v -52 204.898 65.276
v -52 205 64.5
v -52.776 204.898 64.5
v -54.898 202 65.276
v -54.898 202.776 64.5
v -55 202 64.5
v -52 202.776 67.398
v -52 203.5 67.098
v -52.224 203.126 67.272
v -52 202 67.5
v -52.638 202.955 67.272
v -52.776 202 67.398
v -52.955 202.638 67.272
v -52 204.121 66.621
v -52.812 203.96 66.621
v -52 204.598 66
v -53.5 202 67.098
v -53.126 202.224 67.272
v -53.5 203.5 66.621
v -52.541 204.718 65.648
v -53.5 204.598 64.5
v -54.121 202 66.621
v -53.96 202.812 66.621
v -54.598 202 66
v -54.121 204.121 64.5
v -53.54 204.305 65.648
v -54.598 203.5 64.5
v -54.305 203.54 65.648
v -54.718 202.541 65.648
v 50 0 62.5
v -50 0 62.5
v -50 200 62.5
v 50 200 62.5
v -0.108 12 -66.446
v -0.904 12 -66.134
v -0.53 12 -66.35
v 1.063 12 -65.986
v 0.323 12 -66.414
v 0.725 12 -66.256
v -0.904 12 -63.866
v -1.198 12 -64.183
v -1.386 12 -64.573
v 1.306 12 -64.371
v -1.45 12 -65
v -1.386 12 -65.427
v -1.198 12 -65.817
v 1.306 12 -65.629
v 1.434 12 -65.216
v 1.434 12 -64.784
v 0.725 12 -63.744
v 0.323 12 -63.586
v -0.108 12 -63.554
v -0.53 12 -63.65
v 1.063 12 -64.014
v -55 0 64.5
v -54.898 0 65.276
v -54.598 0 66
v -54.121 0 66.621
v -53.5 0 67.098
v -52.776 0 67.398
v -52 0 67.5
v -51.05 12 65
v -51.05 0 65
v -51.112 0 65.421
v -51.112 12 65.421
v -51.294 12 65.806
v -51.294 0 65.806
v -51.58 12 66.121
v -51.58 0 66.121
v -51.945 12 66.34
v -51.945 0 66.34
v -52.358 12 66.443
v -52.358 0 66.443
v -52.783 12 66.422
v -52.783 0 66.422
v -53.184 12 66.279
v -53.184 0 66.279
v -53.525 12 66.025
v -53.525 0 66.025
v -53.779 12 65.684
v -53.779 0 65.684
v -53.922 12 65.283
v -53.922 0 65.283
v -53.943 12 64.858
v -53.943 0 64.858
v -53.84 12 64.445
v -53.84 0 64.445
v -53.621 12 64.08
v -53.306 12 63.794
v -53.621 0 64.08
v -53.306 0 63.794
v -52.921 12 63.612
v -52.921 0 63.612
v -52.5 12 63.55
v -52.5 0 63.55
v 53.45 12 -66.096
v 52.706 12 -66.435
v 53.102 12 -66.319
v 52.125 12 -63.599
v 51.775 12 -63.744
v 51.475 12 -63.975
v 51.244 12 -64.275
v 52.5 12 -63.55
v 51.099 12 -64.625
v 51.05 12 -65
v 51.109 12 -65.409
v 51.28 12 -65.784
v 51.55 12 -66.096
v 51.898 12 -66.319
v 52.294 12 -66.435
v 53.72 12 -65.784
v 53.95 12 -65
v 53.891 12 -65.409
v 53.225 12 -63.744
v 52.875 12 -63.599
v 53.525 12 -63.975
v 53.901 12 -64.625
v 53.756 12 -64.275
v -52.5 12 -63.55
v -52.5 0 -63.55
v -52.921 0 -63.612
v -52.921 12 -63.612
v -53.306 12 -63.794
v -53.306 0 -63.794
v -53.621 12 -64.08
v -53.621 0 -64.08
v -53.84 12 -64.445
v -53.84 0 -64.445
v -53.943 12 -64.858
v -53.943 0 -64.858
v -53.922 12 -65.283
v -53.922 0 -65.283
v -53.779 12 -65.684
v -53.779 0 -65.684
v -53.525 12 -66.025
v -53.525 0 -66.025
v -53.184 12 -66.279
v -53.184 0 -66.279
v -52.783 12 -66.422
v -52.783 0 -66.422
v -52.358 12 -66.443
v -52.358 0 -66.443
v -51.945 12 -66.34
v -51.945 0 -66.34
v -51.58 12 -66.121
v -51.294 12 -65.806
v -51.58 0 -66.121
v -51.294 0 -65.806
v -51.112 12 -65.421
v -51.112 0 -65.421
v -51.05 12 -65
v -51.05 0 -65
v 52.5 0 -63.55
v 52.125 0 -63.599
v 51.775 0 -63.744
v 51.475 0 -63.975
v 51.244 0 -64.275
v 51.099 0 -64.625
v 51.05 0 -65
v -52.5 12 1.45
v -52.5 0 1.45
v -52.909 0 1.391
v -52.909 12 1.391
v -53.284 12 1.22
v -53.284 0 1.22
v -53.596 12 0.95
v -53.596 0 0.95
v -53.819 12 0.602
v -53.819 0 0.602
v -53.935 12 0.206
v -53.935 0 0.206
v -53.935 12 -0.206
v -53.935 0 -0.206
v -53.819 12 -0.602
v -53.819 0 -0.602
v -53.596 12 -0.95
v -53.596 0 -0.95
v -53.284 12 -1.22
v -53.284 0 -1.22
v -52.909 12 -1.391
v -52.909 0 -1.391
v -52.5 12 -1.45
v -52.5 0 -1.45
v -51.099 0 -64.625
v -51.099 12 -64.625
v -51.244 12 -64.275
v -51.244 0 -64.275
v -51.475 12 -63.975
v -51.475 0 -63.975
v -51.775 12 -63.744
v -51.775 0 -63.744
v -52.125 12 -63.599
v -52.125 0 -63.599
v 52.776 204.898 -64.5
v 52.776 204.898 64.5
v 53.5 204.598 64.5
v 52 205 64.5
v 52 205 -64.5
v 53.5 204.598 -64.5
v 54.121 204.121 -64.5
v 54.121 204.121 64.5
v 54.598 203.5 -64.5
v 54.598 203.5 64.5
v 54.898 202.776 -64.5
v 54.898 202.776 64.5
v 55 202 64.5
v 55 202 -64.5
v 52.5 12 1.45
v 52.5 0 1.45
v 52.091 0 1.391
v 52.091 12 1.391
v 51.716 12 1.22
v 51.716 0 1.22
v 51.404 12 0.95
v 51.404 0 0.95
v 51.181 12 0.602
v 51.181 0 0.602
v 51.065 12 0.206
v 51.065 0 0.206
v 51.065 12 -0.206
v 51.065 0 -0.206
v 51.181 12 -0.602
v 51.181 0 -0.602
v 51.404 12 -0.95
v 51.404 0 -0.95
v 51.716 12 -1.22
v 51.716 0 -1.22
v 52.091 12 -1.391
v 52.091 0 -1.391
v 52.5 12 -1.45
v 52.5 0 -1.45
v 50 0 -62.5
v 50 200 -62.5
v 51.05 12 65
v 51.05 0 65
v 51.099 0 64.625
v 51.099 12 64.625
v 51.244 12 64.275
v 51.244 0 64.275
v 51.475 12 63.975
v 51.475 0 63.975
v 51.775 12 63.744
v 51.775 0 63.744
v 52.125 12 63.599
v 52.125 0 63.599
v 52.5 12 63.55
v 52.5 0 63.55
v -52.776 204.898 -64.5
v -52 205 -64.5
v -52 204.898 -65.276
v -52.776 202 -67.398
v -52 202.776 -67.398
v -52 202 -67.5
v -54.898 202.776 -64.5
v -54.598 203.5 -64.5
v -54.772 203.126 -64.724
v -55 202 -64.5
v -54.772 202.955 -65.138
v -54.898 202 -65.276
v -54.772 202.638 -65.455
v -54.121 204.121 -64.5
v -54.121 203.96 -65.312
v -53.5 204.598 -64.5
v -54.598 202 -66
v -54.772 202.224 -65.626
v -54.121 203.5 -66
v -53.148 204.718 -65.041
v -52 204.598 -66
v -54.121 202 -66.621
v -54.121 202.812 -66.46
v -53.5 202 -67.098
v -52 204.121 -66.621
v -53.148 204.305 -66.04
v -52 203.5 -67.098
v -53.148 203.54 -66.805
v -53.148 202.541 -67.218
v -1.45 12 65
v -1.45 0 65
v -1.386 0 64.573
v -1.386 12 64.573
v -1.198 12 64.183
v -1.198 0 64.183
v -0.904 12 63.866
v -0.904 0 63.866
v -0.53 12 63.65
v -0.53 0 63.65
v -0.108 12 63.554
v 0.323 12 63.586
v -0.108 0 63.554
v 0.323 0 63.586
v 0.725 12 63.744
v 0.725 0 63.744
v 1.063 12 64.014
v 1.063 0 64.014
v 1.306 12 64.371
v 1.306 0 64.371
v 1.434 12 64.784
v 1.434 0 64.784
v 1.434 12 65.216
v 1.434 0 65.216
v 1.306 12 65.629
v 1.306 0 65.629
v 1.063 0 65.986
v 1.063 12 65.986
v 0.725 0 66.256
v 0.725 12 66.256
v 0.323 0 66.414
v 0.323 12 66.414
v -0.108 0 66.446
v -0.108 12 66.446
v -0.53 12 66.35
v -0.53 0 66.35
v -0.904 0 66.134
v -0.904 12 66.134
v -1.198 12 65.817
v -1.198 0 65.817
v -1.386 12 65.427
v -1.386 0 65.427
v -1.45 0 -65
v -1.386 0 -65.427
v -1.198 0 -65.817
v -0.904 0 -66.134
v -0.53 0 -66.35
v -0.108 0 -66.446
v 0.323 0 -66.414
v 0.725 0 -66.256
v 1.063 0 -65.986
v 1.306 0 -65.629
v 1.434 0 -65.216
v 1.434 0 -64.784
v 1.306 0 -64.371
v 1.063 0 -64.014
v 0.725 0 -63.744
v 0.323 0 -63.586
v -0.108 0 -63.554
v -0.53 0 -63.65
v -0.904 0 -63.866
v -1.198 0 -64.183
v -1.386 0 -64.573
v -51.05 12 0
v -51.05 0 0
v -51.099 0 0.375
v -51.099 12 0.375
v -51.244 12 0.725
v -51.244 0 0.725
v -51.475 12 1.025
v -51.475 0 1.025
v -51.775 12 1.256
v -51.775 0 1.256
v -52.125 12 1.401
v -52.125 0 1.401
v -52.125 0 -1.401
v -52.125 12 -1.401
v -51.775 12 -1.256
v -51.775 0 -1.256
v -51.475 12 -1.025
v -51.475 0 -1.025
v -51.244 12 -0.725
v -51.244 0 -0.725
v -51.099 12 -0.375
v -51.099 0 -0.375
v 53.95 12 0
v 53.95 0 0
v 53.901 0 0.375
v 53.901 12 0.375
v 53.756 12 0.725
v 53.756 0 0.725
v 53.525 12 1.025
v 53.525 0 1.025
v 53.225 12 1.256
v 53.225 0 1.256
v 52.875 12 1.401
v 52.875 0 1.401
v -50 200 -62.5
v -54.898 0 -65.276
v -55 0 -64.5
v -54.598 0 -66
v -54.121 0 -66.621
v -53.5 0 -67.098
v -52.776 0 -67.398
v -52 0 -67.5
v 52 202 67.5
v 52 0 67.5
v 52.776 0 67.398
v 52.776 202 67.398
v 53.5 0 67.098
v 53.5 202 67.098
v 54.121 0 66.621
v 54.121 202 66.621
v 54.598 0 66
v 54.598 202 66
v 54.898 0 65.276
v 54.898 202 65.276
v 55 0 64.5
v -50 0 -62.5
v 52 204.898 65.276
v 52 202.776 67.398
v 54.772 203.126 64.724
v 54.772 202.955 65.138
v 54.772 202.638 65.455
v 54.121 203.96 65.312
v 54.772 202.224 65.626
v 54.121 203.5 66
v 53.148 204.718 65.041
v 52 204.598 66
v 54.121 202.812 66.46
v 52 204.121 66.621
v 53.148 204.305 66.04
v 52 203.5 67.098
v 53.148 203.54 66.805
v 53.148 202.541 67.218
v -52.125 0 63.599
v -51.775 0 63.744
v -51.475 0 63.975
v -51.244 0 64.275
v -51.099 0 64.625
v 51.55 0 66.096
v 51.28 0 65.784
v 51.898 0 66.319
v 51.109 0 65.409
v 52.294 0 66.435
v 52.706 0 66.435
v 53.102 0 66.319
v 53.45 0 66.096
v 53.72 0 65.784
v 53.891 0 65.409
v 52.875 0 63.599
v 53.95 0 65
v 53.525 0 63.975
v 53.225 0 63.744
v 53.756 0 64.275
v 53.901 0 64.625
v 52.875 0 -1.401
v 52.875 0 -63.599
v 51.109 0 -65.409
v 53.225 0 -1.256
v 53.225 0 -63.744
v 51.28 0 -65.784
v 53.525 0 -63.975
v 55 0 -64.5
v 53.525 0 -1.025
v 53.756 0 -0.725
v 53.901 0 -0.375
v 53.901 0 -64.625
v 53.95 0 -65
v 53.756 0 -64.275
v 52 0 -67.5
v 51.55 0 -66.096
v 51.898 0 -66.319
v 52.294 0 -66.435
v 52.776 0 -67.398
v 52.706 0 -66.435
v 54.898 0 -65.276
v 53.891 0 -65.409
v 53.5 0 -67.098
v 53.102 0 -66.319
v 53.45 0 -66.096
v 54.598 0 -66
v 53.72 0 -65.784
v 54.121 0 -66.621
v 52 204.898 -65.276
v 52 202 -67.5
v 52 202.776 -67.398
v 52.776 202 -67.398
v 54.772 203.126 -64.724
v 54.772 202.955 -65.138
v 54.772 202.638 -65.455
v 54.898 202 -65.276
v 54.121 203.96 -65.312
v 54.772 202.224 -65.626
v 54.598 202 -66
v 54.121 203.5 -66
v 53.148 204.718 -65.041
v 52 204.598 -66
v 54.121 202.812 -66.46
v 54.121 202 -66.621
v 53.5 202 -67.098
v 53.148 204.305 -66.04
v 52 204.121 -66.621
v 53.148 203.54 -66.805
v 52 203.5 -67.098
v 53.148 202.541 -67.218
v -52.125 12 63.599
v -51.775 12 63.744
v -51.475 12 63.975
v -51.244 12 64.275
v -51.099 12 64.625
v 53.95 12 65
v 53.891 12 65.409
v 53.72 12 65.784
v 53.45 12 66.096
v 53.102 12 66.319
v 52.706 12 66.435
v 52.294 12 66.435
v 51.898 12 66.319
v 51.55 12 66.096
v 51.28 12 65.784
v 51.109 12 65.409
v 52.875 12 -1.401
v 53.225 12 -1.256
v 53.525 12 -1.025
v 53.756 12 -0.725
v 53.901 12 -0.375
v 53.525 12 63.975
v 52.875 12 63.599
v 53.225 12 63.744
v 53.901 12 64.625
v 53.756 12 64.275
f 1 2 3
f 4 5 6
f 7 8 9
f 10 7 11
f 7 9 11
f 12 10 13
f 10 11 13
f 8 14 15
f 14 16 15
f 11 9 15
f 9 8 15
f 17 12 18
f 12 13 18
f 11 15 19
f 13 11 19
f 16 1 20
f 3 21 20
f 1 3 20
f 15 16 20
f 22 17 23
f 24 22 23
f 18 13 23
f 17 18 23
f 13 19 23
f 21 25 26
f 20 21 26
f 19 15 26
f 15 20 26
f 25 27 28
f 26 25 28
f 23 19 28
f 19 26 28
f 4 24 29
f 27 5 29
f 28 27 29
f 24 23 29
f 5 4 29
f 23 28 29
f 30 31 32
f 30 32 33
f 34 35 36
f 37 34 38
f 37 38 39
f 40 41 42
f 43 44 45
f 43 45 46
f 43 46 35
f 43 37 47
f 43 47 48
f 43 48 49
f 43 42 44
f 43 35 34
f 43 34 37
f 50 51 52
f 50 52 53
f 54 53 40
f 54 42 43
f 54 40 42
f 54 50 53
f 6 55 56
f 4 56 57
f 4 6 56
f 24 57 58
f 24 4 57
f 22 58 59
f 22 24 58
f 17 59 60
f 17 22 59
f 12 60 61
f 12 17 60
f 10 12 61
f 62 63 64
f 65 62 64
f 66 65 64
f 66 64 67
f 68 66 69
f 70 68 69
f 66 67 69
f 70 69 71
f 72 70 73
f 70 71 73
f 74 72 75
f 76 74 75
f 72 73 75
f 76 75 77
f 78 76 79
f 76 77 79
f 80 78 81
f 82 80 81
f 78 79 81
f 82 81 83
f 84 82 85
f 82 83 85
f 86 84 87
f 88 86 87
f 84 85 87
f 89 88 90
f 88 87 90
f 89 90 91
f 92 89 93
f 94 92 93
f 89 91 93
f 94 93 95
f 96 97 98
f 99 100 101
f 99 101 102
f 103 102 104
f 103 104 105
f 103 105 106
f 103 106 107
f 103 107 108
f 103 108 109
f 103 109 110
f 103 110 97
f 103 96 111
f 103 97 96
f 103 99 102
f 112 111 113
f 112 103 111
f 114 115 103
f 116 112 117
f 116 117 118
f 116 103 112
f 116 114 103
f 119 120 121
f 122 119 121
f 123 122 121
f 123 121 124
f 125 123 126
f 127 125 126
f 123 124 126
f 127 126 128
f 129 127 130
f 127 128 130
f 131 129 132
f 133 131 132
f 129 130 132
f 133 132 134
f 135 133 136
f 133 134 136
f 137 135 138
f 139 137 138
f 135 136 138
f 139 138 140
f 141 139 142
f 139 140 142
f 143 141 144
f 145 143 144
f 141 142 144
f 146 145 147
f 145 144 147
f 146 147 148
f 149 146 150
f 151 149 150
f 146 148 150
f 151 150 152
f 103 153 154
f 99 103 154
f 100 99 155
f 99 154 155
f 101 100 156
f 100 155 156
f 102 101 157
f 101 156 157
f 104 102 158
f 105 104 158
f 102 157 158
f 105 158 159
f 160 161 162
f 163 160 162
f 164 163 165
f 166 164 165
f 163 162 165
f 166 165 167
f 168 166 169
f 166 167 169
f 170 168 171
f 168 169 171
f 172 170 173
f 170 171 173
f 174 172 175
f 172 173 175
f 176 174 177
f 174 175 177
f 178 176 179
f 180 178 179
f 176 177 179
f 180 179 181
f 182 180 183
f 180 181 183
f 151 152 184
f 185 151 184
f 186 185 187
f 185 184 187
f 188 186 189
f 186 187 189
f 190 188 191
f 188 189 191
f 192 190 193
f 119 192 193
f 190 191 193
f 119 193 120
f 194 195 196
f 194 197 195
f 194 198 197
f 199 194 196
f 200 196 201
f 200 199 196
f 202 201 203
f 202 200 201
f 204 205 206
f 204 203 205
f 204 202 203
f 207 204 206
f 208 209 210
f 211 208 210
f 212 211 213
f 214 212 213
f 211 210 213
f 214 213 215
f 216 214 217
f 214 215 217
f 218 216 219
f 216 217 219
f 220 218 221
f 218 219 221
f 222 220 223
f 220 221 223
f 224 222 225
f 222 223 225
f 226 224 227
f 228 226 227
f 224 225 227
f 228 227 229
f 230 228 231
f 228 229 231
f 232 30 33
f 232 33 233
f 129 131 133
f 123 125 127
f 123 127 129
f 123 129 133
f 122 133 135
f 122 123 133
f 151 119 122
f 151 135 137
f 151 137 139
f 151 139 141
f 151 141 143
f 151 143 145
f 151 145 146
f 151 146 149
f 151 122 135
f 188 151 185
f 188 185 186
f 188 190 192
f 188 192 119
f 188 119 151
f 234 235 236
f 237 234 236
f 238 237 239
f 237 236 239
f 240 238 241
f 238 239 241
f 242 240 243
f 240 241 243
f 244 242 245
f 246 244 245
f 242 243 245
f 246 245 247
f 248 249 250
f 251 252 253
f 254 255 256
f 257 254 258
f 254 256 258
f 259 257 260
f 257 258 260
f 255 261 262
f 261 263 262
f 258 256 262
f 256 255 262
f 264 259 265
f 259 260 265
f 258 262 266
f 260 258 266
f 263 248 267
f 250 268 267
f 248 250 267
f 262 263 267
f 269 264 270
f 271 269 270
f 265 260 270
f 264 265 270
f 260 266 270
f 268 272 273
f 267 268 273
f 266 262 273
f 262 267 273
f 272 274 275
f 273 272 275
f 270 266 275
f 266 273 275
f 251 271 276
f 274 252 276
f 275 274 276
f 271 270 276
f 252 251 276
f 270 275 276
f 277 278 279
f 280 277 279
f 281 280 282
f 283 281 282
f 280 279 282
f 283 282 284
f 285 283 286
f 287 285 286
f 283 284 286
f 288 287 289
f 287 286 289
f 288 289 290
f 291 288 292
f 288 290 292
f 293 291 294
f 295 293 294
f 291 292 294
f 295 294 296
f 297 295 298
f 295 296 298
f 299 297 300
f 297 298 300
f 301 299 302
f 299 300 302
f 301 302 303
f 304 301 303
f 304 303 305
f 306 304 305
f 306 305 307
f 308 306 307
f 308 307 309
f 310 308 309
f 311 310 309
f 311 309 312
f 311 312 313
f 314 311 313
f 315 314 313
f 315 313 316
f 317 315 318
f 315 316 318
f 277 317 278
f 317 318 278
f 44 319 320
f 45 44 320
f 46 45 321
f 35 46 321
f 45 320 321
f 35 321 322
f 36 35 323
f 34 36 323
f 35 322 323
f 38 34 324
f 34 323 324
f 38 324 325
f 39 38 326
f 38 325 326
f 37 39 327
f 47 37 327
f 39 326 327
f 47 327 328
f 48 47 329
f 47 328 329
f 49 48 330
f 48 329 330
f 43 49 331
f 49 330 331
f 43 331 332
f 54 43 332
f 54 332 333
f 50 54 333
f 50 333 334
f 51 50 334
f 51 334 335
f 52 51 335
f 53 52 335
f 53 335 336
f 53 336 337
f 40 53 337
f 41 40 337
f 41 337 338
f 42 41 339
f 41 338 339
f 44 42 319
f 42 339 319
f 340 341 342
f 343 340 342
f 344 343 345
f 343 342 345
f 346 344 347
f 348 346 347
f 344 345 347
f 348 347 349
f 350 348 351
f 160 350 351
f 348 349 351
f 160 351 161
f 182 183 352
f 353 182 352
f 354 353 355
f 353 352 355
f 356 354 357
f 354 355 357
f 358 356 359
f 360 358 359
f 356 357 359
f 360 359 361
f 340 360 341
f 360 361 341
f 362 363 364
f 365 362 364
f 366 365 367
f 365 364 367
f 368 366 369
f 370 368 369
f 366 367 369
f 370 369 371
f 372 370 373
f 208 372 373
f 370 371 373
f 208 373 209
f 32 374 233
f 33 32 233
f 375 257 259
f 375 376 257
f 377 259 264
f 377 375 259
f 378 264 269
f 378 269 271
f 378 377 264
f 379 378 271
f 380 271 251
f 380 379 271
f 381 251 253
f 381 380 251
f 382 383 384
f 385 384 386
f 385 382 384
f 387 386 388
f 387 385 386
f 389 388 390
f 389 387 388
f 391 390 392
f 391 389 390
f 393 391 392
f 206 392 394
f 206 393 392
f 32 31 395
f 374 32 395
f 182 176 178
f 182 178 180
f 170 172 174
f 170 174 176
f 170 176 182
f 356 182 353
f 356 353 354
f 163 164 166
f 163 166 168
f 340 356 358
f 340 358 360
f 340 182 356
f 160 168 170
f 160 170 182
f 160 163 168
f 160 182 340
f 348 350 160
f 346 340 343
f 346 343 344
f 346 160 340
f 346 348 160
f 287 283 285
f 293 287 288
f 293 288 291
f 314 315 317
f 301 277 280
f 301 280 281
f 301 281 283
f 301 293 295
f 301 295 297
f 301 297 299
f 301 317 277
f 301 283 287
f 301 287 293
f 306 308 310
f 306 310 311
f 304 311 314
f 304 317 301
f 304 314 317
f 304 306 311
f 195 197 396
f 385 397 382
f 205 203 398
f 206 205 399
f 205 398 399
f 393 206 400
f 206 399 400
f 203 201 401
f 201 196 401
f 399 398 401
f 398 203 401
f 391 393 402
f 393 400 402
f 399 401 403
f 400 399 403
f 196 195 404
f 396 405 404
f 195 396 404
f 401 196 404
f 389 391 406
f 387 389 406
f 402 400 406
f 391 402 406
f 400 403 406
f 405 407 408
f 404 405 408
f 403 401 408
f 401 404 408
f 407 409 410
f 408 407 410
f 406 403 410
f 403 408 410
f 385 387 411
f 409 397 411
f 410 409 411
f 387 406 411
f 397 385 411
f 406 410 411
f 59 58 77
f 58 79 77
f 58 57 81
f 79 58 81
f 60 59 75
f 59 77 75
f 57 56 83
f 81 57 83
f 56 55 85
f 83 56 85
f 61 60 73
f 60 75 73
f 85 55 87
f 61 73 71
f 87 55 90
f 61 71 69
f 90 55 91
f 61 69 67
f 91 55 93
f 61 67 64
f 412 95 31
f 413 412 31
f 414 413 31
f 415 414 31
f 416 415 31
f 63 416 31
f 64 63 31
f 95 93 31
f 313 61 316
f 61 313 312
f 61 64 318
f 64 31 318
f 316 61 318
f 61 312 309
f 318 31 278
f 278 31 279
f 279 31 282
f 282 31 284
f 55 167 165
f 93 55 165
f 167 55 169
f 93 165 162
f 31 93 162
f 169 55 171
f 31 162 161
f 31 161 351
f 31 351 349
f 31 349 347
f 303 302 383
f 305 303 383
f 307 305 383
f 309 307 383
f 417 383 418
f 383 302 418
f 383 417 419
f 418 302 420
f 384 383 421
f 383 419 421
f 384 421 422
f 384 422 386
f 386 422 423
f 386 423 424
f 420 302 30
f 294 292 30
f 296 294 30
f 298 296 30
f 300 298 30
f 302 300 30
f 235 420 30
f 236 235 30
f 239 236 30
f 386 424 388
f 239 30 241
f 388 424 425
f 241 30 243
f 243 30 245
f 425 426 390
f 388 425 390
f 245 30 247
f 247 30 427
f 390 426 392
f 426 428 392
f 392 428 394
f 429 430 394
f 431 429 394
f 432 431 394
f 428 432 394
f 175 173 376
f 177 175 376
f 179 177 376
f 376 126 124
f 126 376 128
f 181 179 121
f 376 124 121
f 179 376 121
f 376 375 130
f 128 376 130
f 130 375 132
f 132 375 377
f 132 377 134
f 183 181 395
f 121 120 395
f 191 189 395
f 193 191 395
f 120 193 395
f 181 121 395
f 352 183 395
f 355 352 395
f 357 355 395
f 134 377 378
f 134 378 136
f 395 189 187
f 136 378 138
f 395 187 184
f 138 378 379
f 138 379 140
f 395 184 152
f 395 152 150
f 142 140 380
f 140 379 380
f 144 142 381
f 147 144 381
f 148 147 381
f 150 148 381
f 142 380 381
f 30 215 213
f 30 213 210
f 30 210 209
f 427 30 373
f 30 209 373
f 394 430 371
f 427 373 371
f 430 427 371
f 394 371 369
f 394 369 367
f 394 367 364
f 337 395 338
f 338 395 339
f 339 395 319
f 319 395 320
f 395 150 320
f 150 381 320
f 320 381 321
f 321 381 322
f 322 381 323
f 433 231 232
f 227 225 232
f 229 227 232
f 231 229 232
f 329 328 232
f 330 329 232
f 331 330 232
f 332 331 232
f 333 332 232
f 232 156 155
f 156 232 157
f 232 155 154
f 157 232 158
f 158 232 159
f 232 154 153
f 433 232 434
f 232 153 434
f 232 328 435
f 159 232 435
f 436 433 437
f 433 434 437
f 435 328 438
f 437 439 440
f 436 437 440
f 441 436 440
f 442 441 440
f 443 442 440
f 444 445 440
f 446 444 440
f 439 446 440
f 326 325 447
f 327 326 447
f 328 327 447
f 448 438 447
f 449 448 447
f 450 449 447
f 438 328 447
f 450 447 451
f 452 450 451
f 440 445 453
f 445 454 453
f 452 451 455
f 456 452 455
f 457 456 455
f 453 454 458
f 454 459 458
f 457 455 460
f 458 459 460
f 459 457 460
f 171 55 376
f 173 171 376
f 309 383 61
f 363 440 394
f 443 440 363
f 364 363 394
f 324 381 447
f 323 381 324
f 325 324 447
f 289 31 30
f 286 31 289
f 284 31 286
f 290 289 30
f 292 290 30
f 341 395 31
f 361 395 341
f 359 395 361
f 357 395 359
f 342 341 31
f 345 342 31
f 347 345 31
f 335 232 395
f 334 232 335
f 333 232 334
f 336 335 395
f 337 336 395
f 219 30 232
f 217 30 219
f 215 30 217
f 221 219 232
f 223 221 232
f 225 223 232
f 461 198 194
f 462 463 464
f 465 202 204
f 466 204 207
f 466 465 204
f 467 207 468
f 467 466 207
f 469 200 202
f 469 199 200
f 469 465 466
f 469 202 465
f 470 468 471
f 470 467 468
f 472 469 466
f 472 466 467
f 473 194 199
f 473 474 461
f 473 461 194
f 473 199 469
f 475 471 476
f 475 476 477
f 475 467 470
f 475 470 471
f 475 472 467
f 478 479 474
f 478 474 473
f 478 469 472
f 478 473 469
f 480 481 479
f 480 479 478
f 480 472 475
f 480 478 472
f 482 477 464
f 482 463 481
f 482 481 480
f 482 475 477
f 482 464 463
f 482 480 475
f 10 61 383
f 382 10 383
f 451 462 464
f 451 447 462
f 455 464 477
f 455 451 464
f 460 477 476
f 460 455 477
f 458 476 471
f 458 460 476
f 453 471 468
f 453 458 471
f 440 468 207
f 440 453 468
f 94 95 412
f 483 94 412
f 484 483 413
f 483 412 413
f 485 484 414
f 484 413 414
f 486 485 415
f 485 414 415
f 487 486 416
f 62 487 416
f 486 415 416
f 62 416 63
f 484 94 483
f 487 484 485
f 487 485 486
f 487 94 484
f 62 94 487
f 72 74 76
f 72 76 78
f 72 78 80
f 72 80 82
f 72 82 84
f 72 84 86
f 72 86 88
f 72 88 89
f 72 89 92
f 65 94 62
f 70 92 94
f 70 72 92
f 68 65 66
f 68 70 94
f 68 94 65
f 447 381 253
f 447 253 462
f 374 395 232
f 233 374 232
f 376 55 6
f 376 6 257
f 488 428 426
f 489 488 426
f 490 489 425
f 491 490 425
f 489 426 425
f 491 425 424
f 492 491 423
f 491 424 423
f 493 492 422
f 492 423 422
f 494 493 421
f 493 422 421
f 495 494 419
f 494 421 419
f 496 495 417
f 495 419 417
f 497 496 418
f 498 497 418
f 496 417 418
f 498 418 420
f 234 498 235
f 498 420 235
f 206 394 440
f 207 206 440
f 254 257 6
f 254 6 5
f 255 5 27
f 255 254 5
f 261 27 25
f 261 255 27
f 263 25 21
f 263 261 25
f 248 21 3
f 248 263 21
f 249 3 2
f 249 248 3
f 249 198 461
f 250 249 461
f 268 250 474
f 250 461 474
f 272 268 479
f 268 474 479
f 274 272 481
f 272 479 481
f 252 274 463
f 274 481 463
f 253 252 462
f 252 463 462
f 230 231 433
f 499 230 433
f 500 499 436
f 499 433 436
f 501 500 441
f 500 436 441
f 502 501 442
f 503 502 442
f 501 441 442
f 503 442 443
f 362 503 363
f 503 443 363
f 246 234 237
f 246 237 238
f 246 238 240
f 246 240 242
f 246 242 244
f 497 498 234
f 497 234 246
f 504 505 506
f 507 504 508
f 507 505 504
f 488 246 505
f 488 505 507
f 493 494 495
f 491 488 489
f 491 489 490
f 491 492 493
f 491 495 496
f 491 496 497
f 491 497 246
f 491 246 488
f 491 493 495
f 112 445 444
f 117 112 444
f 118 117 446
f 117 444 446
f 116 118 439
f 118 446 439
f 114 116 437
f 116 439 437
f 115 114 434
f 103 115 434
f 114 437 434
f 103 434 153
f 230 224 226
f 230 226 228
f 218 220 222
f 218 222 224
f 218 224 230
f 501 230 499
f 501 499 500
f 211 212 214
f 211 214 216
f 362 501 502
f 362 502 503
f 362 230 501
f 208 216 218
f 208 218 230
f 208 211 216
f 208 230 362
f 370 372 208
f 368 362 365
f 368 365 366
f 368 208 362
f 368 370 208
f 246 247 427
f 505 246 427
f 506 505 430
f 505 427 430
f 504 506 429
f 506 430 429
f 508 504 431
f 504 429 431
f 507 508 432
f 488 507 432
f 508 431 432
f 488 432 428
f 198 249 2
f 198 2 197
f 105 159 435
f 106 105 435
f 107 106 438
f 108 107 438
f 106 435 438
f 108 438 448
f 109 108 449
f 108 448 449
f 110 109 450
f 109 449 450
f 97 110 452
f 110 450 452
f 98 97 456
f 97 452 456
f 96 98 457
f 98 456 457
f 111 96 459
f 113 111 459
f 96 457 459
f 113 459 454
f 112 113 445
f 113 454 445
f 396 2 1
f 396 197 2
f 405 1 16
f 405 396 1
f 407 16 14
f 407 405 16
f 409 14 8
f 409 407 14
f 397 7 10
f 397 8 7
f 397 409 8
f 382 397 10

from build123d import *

# Parameters (mm, degrees)
SKETCH1_W           = 110
SKETCH1_H           = 135
SKETCH1_W_2         = 100
SKETCH1_H_2         = 125
BOSS_EXTRUDE1_DEPTH = 200
SKETCH2_W           = 110
SKETCH2_H           = 135
BOSS_EXTRUDE2_DEPTH = 5
CUT_EXTRUDE1_DEPTH  = 12
FILLET1_R           = 3


with BuildPart() as part:
    # Sketch1 → Boss-Extrude1 (new body)
    with BuildSketch(Plane(origin=(0, 0, 0), x_dir=(1, 0, 0), z_dir=(0, 1, 0))):
        Rectangle(SKETCH1_W, SKETCH1_H)
        Rectangle(SKETCH1_W_2, SKETCH1_H_2, mode=Mode.SUBTRACT)
    extrude(amount=BOSS_EXTRUDE1_DEPTH)

    # Sketch2 → Boss-Extrude2 (add)
    with BuildSketch(Plane(origin=(0, 200, 0), x_dir=(1, 0, 0), z_dir=(0, 1, 0))):
        Rectangle(SKETCH2_W, SKETCH2_H)
    extrude(amount=BOSS_EXTRUDE2_DEPTH)

    # Sketch3 → Cut-Extrude1 (cut)
    with BuildSketch(Plane.XZ):
        with BuildLine():
            ThreePointArc((1.45, -65), (0, -63.55), (-1.45, -65))
            Line((-1.45, -65), (1.45, -65))
        make_face()
        with BuildLine():
            Line((1.45, -65), (-1.45, -65))
            ThreePointArc((-1.45, -65), (0, -66.45), (1.45, -65))
        make_face()
        with BuildLine():
            ThreePointArc((53.95, -65), (53.525304833, -63.974695167), (52.5, -63.55))
            Line((52.5, -63.55), (52.5, -65))
            Line((52.5, -65), (51.05, -65))
            ThreePointArc((51.05, -65), (52.5, -66.45), (53.95, -65))
        make_face()
        with BuildLine():
            Line((52.5, -65), (52.5, -63.55))
            ThreePointArc((52.5, -63.55), (51.474695167, -63.974695167), (51.05, -65))
            Line((51.05, -65), (52.5, -65))
        make_face()
        with BuildLine():
            ThreePointArc((53.95, 0), (53.525304833, 1.025304833), (52.5, 1.45))
            Line((52.5, 1.45), (52.5, -1.45))
            ThreePointArc((52.5, -1.45), (53.525304833, -1.025304833), (53.95, 0))
        make_face()
        with BuildLine():
            Line((52.5, -1.45), (52.5, 1.45))
            ThreePointArc((52.5, 1.45), (51.05, 0), (52.5, -1.45))
        make_face()
        with BuildLine():
            ThreePointArc((53.95, 65), (52.5, 66.45), (51.05, 65))
            Line((51.05, 65), (52.5, 65))
            Line((52.5, 65), (52.5, 63.55))
            ThreePointArc((52.5, 63.55), (53.525304833, 63.974695167), (53.95, 65))
        make_face()
        with BuildLine():
            Line((52.5, 65), (51.05, 65))
            ThreePointArc((51.05, 65), (51.474695167, 63.974695167), (52.5, 63.55))
            Line((52.5, 63.55), (52.5, 65))
        make_face()
        with BuildLine():
            ThreePointArc((1.45, 65), (0, 66.45), (-1.45, 65))
            Line((-1.45, 65), (1.45, 65))
        make_face()
        with BuildLine():
            Line((1.45, 65), (-1.45, 65))
            ThreePointArc((-1.45, 65), (0, 63.55), (1.45, 65))
        make_face()
        with BuildLine():
            Line((-52.5, 63.55), (-52.5, 65))
            Line((-52.5, 65), (-51.05, 65))
            ThreePointArc((-51.05, 65), (-53.525304833, 66.025304833), (-52.5, 63.55))
        make_face()
        with BuildLine():
            Line((-51.05, 65), (-52.5, 65))
            Line((-52.5, 65), (-52.5, 63.55))
            ThreePointArc((-52.5, 63.55), (-51.474695167, 63.974695167), (-51.05, 65))
        make_face()
        with BuildLine():
            ThreePointArc((-51.05, 0), (-51.474695167, 1.025304833), (-52.5, 1.45))
            Line((-52.5, 1.45), (-52.5, -1.45))
            ThreePointArc((-52.5, -1.45), (-51.474695167, -1.025304833), (-51.05, 0))
        make_face()
        with BuildLine():
            Line((-52.5, -1.45), (-52.5, 1.45))
            ThreePointArc((-52.5, 1.45), (-53.95, 0), (-52.5, -1.45))
        make_face()
        with BuildLine():
            ThreePointArc((-51.05, -65), (-51.474695167, -63.974695167), (-52.5, -63.55))
            Line((-52.5, -63.55), (-52.5, -65))
            Line((-52.5, -65), (-51.05, -65))
        make_face()
        with BuildLine():
            Line((-52.5, -65), (-52.5, -63.55))
            ThreePointArc((-52.5, -63.55), (-53.525304833, -66.025304833), (-51.05, -65))
            Line((-51.05, -65), (-52.5, -65))
        make_face()
    extrude(amount=-CUT_EXTRUDE1_DEPTH, mode=Mode.SUBTRACT)

    # Fillet1
    fillet1_edges = [part.edges().sort_by_distance(p)[0] for p in [
        (0, 205, -67.5),
        (-55, 205, 0),
        (0, 205, 67.5),
        (55, 205, 0),
        (-55, 102.5, -67.5),
        (55, 102.5, -67.5),
        (55, 102.5, 67.5),
        (-55, 102.5, 67.5),
    ]]
    fillet(fillet1_edges, radius=FILLET1_R)


solid = part.part
